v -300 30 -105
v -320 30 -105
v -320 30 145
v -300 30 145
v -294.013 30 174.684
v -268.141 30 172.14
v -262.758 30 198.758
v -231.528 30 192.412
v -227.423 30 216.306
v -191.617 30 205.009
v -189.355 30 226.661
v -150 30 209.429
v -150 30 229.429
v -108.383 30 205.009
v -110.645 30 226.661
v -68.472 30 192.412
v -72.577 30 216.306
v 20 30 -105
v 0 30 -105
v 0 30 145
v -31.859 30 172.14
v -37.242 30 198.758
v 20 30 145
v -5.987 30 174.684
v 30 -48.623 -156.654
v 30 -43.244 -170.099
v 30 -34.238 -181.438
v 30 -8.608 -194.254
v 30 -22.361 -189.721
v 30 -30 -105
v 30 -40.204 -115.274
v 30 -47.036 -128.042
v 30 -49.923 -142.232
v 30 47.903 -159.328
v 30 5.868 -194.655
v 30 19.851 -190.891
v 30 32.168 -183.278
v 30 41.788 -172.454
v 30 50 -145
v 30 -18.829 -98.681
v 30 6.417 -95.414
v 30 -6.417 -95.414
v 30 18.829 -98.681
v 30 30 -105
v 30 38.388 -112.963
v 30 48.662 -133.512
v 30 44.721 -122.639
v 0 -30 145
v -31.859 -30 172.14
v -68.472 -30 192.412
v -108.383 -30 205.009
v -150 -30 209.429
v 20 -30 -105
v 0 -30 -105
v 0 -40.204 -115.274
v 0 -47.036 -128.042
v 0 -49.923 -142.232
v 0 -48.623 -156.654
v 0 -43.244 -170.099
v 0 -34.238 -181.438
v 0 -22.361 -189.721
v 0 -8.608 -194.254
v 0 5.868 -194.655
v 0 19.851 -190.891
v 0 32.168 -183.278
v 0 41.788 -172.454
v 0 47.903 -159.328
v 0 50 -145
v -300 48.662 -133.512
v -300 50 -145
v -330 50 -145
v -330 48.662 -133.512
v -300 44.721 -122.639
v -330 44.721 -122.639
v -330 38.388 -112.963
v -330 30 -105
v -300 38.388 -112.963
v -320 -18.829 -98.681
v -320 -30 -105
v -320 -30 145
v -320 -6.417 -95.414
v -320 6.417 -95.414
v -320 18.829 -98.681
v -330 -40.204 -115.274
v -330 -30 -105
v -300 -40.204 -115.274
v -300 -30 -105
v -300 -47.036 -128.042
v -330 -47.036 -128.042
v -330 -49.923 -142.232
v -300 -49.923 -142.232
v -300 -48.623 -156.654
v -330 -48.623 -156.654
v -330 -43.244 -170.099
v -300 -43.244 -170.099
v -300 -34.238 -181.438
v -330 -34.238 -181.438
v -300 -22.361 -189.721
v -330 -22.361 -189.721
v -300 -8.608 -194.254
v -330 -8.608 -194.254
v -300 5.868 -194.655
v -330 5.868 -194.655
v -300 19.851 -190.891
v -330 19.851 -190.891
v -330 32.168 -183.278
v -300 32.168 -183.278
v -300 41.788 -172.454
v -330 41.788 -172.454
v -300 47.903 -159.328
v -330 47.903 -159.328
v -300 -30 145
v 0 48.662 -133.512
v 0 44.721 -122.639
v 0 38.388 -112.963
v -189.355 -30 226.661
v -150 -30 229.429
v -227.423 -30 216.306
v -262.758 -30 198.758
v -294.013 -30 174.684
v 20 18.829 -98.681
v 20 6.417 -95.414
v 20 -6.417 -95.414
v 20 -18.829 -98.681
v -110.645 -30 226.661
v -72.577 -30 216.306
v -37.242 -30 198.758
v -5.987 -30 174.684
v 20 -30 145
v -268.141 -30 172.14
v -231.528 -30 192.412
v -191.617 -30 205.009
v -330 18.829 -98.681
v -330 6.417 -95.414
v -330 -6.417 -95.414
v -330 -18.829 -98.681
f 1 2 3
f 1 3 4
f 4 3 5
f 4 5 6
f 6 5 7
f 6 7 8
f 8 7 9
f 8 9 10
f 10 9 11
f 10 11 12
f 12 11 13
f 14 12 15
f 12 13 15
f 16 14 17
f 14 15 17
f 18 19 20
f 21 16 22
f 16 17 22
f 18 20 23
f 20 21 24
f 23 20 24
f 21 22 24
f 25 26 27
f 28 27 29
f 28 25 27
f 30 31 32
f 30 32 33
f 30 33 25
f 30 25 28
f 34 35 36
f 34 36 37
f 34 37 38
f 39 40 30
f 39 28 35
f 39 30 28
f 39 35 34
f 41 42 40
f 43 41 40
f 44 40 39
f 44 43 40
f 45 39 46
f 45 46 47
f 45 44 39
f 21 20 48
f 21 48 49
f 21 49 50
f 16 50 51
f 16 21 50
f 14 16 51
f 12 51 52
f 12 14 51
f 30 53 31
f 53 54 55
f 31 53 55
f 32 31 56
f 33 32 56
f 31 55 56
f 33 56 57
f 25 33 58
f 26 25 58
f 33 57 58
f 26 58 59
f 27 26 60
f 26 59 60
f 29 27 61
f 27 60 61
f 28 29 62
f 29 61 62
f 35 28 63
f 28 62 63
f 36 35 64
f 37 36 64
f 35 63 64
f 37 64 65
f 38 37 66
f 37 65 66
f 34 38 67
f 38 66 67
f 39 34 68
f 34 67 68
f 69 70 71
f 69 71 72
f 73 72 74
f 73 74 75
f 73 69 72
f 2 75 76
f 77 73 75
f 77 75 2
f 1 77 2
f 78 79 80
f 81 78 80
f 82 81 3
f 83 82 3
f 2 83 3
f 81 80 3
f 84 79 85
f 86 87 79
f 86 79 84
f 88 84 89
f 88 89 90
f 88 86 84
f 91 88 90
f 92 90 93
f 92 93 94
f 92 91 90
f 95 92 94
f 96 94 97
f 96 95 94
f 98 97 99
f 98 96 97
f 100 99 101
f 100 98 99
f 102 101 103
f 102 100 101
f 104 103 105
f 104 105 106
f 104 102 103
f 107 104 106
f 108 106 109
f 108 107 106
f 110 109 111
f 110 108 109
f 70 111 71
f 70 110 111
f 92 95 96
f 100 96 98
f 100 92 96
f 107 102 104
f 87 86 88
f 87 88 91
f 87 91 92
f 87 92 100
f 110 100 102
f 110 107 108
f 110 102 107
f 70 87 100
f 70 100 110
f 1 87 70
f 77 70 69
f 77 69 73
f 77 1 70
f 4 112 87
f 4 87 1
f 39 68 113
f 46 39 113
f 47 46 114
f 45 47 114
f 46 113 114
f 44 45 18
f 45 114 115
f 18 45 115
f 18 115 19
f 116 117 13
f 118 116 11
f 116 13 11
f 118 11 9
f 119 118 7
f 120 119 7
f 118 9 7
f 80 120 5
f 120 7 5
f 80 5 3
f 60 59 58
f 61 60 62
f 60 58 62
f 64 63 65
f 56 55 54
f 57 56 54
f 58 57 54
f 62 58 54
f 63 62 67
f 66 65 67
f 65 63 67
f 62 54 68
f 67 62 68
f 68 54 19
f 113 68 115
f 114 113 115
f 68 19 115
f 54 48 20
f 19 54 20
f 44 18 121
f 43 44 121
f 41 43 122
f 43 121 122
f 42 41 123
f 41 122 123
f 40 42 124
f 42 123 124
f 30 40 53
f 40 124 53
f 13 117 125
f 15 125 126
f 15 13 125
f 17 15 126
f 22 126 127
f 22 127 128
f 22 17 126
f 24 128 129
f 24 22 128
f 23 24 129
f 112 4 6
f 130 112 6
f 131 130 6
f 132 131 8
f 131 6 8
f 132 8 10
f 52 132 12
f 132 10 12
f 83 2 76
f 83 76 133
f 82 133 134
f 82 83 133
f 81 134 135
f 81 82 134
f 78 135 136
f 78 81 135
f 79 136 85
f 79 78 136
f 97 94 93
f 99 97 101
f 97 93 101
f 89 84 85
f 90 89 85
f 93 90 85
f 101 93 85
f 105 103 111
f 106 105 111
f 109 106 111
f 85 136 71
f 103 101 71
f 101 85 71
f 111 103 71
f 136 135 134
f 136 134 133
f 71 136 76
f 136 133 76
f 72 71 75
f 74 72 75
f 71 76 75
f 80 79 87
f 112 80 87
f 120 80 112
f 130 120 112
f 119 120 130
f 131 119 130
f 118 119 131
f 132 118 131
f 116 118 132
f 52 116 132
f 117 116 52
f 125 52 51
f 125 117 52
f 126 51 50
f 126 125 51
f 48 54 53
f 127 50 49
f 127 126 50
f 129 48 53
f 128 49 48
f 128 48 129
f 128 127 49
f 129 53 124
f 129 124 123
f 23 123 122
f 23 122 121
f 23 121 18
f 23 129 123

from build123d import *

# Parameters (mm, degrees)
F1_DEPTH = 30
F2_DEPTH = 20
F3_W     = 61.814844
F3_H     = 59.7312
F4_DEPTH = 50
F6_DEPTH = 60


with BuildPart() as f1:
    # F0 (on Right) → F1 (new body)
    with BuildSketch(Plane.YZ):
        with BuildLine():
            ThreePointArc((50, -145), (44.72136, -122.63932), (30, -105))
            ThreePointArc((30, -105), (0, -95), (-30, -105))
            ThreePointArc((-30, -105), (-22.36068, -189.72136), (50, -145))
        make_face()
    extrude(amount=F1_DEPTH)

    # F0 (on Right) → F2 (join)
    with BuildSketch(Plane.YZ):
        with BuildLine():
            Line((30, -105), (30, 145))
            Line((30, 145), (-30, 145))
            Line((-30, 145), (-30, -105))
            ThreePointArc((-30, -105), (0, -95), (30, -105))
        make_face()
        with BuildLine():
            ThreePointArc((50, -145), (44.72136, -122.63932), (30, -105))
            ThreePointArc((30, -105), (0, -95), (-30, -105))
            ThreePointArc((-30, -105), (-22.36068, -189.72136), (50, -145))
        make_face()
    extrude(amount=F2_DEPTH)

    # F3 (on Front) → F4 (cut, symmetric)
    with BuildSketch(Plane.XZ):
        with Locations((-90.155922, 117.482759)):
            Rectangle(F3_W, F3_H)
    extrude(amount=F4_DEPTH, both=True, mode=Mode.SUBTRACT)

    # F5 (on face) → F6 (join)
    with BuildSketch(Plane(origin=(0, 30, 0), x_dir=(-1, 0, 0), z_dir=(0, 1, 0))):
        with BuildLine():
            ThreePointArc((0, 145), (68.472419, 192.411567), (150, 209.428685))
            Line((150, 209.428685), (150, 229.428685))
            ThreePointArc((150, 229.428685), (54.480666, 208.395375), (-20, 145))
            Line((-20, 145), (0, 145))
        make_face()
    extrude(amount=-F6_DEPTH)

    # F7: F1 across face


with BuildPart() as f1_1:
    add(f1.part)
    add(f1.part.mirror(Plane(origin=(-150, 0, 219.428685), x_dir=(0, -1, 0), z_dir=(-1, 0, 0))))


solid = f1_1.part
